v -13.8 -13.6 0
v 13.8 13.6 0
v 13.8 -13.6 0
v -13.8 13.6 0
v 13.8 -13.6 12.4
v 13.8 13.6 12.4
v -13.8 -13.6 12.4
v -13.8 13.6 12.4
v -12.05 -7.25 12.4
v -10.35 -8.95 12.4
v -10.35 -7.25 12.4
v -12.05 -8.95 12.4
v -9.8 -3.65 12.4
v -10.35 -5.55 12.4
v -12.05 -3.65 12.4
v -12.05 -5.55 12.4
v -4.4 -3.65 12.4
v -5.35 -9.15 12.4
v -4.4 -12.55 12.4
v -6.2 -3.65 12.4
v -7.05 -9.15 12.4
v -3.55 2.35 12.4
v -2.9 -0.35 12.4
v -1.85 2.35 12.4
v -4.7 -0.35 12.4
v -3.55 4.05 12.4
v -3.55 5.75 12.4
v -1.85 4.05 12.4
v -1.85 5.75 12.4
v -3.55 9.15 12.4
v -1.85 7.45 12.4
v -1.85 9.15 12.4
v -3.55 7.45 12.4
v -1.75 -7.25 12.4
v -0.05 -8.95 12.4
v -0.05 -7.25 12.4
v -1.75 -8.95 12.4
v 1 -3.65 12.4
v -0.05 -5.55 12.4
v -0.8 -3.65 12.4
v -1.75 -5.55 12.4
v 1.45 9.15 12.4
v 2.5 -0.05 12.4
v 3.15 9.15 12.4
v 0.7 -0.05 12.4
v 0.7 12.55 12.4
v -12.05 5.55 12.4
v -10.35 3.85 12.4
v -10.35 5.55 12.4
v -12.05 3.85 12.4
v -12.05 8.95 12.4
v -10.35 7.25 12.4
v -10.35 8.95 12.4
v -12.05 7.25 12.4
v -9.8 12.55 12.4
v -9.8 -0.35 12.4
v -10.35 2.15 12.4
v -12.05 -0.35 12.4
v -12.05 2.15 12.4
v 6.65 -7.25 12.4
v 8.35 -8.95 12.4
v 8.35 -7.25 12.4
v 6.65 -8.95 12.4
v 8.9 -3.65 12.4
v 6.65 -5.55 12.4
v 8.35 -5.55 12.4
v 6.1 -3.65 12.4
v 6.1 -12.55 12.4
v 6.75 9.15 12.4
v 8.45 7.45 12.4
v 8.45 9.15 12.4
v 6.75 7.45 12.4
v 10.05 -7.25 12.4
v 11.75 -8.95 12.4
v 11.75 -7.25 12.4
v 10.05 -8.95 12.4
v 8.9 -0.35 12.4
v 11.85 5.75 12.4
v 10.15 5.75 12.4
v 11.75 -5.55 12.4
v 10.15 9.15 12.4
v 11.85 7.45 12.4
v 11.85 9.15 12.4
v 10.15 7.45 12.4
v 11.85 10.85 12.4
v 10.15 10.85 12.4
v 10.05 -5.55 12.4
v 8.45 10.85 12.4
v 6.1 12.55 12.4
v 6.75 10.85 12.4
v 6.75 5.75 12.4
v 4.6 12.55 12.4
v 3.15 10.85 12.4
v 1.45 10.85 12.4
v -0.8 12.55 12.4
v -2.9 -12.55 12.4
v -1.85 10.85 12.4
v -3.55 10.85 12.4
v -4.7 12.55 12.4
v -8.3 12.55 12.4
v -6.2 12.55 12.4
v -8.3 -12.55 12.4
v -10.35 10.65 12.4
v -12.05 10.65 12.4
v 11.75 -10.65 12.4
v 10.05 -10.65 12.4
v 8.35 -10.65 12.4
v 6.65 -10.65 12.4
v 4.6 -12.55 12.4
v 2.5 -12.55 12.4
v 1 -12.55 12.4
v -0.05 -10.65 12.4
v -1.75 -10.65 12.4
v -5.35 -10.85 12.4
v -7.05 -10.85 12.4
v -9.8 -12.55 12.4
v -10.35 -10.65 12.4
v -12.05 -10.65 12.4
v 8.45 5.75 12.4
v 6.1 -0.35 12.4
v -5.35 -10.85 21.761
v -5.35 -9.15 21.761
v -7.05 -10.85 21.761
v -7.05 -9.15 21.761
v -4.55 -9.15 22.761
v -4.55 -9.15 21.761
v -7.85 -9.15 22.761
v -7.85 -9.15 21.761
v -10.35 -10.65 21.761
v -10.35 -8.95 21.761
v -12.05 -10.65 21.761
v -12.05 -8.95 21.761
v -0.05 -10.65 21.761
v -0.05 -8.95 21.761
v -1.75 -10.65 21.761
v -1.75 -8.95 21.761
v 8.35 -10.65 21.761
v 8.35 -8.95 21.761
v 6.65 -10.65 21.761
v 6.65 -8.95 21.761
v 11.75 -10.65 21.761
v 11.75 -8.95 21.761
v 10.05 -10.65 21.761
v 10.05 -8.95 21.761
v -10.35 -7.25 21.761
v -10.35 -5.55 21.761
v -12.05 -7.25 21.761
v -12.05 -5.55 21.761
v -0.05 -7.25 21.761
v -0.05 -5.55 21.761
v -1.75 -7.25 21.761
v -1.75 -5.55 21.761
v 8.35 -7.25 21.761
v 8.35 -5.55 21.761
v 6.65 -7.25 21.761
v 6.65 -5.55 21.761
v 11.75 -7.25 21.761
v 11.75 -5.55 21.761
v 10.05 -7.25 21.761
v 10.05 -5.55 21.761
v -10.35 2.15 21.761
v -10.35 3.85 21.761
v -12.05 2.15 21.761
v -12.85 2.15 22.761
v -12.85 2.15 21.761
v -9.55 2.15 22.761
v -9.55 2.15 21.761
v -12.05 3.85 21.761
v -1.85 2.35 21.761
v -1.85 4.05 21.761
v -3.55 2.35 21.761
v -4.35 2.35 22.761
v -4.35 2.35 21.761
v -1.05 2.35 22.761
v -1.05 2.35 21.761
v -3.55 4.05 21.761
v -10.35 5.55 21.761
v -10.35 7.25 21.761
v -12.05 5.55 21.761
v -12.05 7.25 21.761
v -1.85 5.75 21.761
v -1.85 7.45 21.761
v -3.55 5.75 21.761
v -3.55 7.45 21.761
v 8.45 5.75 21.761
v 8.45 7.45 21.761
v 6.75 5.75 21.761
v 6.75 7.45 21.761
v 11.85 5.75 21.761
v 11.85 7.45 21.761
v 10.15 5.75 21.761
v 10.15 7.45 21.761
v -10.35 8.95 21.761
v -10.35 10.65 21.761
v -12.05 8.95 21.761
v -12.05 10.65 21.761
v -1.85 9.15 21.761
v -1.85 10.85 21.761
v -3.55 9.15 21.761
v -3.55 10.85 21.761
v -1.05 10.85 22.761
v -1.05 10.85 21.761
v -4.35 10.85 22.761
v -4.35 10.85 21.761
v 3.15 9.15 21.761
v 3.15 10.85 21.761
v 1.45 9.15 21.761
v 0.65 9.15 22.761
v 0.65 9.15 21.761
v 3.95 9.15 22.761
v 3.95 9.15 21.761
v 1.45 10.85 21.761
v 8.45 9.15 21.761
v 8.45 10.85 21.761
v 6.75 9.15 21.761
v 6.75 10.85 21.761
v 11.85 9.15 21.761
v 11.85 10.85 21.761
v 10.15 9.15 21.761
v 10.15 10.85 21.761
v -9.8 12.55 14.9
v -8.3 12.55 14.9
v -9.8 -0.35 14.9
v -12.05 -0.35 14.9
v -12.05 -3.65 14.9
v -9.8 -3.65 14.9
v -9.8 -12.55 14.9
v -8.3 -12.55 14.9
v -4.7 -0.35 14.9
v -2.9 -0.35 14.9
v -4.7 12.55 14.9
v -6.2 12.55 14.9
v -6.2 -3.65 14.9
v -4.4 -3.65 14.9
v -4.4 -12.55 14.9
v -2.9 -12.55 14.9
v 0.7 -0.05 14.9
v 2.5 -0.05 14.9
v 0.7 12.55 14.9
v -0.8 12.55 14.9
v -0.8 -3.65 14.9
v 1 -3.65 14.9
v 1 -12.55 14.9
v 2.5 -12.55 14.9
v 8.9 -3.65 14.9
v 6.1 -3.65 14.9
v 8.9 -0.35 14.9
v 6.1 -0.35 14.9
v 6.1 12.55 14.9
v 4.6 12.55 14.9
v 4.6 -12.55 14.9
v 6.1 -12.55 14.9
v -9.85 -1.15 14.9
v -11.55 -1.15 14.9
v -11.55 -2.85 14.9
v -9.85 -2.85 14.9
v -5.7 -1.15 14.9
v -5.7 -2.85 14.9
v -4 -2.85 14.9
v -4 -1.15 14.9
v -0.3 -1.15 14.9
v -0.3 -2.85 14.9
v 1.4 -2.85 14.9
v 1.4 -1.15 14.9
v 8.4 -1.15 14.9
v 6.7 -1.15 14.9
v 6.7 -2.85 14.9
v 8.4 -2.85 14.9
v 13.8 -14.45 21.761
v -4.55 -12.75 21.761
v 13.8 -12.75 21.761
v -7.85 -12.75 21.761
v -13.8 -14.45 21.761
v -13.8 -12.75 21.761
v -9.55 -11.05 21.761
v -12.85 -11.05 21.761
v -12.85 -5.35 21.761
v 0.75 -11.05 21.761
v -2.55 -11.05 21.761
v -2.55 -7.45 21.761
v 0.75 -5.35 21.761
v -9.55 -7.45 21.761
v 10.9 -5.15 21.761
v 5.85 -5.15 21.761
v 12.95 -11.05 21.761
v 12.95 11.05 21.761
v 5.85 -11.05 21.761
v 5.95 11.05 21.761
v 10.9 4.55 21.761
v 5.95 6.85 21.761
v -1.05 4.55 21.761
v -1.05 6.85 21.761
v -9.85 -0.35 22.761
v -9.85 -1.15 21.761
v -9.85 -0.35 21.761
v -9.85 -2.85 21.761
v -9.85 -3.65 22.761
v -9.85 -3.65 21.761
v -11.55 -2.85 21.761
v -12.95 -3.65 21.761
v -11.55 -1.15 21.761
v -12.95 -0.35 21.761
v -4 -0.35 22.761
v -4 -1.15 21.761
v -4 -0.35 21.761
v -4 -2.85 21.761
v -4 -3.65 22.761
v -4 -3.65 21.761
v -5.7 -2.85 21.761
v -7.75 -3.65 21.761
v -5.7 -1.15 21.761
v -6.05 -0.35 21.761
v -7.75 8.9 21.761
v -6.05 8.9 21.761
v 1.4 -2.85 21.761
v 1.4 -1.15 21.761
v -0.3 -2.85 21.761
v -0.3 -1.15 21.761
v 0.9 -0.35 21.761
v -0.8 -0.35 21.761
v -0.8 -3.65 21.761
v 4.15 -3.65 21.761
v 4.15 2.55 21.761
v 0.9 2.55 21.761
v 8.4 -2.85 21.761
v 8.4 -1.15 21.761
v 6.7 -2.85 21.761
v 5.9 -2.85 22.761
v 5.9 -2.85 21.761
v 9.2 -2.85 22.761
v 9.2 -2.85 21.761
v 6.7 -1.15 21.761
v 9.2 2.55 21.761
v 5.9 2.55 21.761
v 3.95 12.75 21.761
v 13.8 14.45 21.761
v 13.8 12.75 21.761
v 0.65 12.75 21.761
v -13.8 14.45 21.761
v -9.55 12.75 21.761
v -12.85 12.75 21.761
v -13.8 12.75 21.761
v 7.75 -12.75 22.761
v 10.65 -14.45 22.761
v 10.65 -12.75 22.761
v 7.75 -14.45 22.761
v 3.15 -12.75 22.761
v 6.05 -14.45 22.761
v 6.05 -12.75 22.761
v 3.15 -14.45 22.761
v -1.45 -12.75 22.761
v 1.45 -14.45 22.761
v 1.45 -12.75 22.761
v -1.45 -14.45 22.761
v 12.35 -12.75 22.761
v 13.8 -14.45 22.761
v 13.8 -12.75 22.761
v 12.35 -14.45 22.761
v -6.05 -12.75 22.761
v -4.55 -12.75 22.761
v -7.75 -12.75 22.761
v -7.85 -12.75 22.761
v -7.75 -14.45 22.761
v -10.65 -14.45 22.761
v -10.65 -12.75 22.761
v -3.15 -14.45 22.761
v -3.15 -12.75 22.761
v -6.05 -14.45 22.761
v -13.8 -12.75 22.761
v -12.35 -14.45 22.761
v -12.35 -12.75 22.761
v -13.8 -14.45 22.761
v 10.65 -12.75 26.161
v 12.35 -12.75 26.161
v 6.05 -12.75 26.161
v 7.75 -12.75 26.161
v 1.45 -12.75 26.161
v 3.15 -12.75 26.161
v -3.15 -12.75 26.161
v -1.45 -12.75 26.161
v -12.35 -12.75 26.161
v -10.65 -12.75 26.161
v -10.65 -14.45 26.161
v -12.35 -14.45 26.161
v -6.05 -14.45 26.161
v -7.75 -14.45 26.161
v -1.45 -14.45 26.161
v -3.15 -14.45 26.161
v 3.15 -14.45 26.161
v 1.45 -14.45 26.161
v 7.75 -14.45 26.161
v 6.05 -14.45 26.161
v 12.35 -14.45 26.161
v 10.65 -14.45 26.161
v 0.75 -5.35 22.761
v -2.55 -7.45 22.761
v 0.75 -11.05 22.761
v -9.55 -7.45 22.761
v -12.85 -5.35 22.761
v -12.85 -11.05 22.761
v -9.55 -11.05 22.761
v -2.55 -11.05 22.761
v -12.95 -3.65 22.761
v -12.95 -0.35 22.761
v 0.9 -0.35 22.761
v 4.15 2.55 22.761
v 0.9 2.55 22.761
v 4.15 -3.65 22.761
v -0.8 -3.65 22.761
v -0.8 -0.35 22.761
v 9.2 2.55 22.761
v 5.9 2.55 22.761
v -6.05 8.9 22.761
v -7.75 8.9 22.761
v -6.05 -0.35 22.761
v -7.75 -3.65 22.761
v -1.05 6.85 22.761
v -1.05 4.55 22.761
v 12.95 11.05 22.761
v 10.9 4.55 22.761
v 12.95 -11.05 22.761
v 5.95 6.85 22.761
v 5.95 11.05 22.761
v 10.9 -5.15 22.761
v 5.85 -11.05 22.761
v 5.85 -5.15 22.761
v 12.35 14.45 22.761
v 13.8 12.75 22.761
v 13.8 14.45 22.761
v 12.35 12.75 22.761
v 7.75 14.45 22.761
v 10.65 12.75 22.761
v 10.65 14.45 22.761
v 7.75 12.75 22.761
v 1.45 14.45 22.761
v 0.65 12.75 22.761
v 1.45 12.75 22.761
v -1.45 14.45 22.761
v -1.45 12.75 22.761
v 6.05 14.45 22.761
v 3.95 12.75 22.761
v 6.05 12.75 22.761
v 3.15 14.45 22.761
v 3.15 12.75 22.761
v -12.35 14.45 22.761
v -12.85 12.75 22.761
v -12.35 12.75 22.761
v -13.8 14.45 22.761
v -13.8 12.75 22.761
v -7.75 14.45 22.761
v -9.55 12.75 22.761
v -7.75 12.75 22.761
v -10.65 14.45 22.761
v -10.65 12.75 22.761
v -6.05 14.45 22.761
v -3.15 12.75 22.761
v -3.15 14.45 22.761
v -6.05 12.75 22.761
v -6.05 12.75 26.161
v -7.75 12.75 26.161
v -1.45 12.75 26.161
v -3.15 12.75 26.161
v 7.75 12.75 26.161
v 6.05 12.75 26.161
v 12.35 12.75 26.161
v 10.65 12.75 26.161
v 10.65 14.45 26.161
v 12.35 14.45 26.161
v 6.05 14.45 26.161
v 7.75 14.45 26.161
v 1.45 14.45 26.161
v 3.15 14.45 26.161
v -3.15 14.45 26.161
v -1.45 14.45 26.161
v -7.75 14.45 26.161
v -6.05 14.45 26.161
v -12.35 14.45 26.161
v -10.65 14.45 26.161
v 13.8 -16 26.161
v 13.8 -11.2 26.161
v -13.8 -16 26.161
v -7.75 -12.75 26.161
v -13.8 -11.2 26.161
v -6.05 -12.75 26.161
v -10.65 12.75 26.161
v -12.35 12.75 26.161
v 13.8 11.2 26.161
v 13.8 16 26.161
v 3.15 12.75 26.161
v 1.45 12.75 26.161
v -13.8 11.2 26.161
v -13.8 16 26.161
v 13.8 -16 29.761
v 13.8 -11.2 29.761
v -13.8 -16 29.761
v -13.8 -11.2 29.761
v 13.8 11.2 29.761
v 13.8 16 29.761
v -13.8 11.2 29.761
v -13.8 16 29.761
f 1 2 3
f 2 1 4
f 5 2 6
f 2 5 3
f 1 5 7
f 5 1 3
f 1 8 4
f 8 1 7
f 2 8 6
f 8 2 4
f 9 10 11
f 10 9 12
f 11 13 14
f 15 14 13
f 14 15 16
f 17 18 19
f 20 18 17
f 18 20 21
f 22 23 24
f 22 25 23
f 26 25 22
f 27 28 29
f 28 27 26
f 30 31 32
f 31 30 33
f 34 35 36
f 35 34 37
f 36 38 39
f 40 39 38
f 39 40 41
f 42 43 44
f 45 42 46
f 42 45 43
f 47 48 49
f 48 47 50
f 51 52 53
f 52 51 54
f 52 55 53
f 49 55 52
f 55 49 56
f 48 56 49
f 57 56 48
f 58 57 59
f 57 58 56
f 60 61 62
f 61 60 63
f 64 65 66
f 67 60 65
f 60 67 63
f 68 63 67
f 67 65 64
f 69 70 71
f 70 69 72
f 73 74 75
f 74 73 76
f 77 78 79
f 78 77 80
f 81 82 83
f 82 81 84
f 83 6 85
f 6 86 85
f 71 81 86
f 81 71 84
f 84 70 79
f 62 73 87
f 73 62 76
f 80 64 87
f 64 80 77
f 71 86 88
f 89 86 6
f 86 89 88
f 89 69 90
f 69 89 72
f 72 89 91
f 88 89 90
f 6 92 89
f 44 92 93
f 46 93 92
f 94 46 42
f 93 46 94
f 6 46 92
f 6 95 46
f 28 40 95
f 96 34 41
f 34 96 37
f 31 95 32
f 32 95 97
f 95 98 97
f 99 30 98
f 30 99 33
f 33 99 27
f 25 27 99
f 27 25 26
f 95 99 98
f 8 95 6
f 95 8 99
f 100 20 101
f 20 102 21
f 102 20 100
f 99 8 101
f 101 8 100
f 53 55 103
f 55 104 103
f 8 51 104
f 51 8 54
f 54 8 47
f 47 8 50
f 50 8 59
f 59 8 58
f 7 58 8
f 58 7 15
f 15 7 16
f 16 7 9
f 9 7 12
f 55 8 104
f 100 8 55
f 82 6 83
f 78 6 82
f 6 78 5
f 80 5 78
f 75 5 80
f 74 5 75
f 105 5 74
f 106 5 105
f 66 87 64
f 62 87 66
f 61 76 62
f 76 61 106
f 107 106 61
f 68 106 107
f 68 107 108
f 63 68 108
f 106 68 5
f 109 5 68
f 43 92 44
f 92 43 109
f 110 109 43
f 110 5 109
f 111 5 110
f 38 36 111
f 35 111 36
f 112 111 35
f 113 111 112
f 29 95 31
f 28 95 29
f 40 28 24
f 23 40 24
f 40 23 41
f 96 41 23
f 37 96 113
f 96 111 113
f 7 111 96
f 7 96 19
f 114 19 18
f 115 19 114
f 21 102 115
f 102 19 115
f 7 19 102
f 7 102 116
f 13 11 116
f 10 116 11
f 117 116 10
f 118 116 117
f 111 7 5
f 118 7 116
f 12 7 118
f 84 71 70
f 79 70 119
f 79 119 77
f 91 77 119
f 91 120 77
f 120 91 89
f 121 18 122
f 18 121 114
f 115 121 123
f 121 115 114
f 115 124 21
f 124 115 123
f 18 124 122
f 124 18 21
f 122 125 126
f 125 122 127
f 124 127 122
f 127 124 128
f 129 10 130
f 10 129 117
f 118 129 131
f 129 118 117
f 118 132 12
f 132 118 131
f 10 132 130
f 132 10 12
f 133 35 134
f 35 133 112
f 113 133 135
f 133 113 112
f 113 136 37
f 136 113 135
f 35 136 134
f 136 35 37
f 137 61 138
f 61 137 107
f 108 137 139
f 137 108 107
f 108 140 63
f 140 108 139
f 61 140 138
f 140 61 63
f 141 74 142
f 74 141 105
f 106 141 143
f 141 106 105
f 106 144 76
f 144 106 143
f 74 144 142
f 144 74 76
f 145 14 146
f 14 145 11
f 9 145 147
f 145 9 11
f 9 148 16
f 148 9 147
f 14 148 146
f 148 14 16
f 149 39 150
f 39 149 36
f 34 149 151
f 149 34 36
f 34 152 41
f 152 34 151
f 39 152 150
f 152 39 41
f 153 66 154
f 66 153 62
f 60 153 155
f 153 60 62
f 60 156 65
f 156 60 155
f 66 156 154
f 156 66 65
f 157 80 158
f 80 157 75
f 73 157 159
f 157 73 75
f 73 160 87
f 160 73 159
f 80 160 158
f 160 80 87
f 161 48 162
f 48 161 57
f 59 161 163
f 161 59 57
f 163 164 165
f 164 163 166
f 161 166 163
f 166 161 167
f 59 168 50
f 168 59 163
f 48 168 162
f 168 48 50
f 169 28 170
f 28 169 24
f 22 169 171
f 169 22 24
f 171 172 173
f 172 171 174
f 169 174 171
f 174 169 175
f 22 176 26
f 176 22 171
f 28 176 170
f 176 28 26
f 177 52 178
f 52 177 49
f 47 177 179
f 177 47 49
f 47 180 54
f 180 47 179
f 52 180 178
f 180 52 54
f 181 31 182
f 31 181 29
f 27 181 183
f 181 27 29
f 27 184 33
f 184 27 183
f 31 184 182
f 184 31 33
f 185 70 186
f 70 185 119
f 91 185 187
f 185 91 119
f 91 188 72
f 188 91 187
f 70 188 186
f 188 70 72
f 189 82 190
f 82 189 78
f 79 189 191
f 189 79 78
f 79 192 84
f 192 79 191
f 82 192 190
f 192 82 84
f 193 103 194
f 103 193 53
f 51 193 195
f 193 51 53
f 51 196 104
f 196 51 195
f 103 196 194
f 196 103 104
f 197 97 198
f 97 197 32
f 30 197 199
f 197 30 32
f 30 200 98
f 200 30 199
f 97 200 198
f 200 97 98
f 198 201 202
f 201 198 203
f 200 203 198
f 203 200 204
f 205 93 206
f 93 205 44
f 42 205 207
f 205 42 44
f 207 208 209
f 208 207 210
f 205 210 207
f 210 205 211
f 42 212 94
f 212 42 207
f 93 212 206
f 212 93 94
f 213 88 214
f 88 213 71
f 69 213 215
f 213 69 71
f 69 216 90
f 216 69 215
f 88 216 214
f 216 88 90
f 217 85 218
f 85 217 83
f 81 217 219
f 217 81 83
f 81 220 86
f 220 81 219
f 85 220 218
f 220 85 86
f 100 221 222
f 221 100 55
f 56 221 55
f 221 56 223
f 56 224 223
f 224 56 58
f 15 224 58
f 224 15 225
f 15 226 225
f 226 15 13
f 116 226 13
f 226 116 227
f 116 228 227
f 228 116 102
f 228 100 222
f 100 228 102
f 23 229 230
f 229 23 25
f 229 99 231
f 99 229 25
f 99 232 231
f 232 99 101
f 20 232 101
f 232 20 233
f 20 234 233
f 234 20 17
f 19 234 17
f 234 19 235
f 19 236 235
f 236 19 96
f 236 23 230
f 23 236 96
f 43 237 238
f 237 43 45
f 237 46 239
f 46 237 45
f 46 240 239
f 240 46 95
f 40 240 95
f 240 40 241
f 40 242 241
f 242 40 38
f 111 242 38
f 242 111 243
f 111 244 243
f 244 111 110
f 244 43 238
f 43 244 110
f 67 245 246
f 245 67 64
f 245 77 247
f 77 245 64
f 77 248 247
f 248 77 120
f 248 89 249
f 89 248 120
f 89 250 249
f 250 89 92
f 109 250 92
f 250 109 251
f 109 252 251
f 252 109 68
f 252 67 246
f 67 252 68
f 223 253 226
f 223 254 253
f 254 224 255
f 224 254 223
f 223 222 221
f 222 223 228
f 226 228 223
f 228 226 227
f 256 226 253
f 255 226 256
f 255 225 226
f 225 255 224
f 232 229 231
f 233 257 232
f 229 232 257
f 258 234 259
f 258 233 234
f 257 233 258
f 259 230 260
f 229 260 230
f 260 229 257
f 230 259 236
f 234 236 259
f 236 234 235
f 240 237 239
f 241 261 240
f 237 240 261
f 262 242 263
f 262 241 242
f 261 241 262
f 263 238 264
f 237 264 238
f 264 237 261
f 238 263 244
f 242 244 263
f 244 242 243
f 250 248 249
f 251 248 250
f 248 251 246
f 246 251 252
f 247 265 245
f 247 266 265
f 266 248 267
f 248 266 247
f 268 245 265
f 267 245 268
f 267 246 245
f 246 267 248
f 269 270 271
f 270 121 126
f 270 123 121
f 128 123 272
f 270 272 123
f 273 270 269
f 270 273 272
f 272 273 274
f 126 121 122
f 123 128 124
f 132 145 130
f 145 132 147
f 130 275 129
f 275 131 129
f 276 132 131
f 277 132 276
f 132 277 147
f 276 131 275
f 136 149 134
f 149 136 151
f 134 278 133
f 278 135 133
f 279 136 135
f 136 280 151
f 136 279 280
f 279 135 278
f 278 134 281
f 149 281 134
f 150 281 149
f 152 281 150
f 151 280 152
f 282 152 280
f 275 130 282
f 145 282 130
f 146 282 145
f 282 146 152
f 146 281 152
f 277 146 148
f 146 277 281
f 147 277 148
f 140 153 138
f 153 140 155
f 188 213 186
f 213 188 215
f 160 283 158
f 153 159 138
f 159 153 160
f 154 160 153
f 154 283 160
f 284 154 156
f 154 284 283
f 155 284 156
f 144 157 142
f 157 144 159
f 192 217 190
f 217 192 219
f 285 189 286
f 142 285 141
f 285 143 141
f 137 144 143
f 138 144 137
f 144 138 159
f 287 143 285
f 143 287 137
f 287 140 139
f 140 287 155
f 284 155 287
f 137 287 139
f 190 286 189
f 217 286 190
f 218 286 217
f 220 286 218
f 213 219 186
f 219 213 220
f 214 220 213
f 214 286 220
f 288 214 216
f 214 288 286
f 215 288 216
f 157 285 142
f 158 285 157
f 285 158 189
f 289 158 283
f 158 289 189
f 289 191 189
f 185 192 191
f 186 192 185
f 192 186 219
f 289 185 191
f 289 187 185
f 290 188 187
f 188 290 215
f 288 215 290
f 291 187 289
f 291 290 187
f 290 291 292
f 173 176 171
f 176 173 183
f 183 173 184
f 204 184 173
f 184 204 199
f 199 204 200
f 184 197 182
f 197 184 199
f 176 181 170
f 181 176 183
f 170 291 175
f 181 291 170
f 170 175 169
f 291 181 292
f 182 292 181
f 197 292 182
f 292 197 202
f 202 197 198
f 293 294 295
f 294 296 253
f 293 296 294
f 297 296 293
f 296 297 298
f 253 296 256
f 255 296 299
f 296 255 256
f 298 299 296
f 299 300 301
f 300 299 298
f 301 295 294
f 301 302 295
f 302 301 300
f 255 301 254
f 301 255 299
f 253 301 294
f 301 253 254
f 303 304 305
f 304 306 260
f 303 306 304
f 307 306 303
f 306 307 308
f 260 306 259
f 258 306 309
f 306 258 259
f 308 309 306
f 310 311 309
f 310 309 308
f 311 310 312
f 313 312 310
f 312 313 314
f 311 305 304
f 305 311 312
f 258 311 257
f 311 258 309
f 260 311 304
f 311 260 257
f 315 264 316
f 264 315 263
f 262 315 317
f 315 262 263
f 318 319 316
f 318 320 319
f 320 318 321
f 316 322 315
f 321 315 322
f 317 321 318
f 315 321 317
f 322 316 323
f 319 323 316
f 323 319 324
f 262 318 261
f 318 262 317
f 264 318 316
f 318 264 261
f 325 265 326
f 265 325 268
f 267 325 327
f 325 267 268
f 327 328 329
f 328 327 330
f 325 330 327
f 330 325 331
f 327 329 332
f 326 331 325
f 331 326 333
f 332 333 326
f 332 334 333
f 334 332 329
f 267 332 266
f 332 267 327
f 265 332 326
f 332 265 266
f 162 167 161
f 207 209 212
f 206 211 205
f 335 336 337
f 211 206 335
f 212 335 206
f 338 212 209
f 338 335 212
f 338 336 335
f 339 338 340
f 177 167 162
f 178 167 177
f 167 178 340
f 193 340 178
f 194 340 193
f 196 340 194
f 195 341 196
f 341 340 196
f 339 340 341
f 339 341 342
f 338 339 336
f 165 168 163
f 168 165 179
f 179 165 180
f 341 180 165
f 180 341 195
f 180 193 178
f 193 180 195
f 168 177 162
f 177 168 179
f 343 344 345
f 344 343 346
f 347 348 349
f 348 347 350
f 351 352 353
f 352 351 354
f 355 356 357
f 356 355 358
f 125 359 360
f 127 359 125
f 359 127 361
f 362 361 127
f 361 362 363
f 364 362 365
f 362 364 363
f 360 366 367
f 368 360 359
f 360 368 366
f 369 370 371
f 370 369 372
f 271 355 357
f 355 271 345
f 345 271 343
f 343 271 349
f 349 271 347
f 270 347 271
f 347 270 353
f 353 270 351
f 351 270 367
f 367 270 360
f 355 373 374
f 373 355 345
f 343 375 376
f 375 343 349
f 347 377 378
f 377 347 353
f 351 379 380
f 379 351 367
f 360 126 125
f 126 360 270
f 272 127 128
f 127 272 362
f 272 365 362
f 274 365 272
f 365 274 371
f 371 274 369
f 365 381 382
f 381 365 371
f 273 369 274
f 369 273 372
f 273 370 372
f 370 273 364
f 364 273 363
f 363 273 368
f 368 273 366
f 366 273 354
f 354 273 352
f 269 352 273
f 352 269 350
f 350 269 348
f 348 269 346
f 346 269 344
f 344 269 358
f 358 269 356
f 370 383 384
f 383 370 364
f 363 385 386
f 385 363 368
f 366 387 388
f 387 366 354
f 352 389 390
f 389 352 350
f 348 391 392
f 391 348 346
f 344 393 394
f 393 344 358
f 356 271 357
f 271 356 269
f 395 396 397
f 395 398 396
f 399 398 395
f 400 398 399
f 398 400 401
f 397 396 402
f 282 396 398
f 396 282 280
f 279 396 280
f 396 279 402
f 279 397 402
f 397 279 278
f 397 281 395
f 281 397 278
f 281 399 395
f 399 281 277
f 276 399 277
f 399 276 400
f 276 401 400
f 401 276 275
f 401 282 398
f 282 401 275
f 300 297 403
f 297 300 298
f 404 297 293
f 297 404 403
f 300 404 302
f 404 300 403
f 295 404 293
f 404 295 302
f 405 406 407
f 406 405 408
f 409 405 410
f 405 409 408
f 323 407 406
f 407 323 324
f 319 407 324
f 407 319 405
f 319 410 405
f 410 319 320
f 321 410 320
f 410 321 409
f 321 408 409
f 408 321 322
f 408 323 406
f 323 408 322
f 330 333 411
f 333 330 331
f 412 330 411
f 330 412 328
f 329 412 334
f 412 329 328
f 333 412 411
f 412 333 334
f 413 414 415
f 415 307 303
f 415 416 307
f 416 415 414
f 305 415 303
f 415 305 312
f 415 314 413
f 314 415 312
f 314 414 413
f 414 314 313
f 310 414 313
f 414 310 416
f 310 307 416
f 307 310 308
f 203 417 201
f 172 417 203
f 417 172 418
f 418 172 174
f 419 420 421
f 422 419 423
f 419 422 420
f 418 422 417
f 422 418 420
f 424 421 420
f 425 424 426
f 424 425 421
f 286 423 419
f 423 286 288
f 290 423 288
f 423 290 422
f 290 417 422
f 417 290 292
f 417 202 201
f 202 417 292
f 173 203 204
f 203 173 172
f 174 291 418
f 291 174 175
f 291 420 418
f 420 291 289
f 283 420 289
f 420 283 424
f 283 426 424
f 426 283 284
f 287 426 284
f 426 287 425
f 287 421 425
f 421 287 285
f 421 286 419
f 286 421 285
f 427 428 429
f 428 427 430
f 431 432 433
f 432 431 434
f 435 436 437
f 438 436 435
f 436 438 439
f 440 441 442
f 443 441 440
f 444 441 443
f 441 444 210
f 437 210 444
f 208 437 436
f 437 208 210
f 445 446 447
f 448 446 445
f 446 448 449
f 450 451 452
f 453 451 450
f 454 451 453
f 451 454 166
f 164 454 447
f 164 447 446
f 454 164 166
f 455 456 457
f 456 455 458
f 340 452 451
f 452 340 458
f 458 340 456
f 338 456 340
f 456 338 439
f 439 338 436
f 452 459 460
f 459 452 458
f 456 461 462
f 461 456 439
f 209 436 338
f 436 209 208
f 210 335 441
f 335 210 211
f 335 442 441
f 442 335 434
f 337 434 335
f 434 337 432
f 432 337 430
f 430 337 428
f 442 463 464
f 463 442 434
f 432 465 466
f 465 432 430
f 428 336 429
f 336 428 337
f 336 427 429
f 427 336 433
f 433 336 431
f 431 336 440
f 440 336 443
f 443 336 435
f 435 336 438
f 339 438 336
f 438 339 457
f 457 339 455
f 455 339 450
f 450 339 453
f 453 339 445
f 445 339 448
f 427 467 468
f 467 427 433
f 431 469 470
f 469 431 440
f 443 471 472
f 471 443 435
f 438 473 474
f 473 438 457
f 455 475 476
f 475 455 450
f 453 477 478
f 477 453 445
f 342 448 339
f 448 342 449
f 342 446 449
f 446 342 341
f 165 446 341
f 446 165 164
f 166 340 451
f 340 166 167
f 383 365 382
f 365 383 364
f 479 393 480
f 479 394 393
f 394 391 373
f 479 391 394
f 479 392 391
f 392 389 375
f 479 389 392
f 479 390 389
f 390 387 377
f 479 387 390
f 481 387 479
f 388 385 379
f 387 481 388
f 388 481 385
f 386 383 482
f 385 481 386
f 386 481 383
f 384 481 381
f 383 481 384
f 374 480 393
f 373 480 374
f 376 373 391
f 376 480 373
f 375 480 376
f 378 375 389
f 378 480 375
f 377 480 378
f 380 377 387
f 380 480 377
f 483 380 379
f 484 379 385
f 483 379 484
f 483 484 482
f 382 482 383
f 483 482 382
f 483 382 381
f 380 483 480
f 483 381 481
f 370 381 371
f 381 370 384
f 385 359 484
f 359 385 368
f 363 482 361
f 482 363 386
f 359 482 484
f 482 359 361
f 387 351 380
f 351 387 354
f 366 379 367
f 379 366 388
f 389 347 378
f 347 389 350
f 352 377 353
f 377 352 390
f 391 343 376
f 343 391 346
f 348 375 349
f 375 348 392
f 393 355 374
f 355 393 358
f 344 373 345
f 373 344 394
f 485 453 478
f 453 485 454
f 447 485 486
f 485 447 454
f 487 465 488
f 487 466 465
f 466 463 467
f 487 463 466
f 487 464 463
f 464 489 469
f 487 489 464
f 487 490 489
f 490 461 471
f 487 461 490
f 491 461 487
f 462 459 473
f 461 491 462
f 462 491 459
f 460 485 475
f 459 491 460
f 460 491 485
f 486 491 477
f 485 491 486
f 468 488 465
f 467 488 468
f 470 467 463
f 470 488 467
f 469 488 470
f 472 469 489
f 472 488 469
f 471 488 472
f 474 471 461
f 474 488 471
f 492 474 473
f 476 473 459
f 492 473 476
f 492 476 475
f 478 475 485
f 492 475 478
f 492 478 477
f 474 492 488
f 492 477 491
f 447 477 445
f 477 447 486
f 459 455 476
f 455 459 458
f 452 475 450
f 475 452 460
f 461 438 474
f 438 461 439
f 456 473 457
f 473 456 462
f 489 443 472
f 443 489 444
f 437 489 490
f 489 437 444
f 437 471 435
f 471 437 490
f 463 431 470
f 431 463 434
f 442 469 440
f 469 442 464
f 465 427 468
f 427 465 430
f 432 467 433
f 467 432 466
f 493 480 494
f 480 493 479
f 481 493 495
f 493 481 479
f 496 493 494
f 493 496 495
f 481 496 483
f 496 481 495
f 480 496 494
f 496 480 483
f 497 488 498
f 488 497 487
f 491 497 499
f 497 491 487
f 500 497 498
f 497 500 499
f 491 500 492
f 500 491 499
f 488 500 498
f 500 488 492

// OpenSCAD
// Generated by SolidPython 0.4.2 on 2020-09-29 23:21:41
//!OpenSCAD

scale(v = 0.0100000000) {
	translate(v = [-1380, -1360, 0]) {
		union() {
			color(c = [0.4000000000, 0.4000000000, 0.4000000000]) {
				translate(v = [0, 0, 0]) {
					linear_extrude(height = 1000.0000000000) {
						polygon(paths = [[0, 1, 2, 3]], points = [[0, 0], [0, 2720], [2760, 2720], [2760, 0]]);
					}
				}
			}
			color(c = [0.2000000000, 0.6000000000, 0.2000000000]) {
				translate(v = [0, 0, 1000.0000000000]) {
					linear_extrude(height = 120.0000000000) {
						polygon(paths = [[0, 1, 2, 3]], points = [[0, 1305], [0, 2720], [2760, 2720], [2760, 1305]]);
					}
				}
			}
			color(c = [0.4000000000, 0.4000000000, 0.4000000000]) {
				translate(v = [0, 0, 1000.0000000000]) {
					linear_extrude(height = 120.0000000000) {
						polygon(paths = [[0, 1, 2, 3]], points = [[0, 0], [0, 1305], [2760, 1305], [2760, 0]]);
					}
				}
			}
			color(c = [0.9000000000, 0.6000000000, 0.6000000000]) {
				translate(v = [0, 0, 1120.0000000000]) {
					linear_extrude(height = 120.0000000000) {
						polygon(paths = [[0, 1, 2, 3]], points = [[135, 1485], [135, 2485], [400, 2485], [400, 1485]]);
					}
				}
			}
			color(c = [0.9000000000, 0.6000000000, 0.6000000000]) {
				translate(v = [0, 0, 1120.0000000000]) {
					linear_extrude(height = 120.0000000000) {
						polygon(paths = [[0, 1, 2, 3]], points = [[550, 1485], [550, 2485], [760, 2485], [760, 1485]]);
					}
				}
			}
			color(c = [0.9000000000, 0.6000000000, 0.6000000000]) {
				translate(v = [0, 0, 1120.0000000000]) {
					linear_extrude(height = 120.0000000000) {
						polygon(paths = [[0, 1, 2, 3]], points = [[910, 1485], [910, 2485], [1300, 2485], [1300, 1485]]);
					}
				}
			}
			color(c = [0.9000000000, 0.6000000000, 0.6000000000]) {
				translate(v = [0, 0, 1120.0000000000]) {
					linear_extrude(height = 120.0000000000) {
						polygon(paths = [[0, 1, 2, 3]], points = [[1450, 1485], [1450, 2485], [1840, 2485], [1840, 1485]]);
					}
				}
			}
			color(c = [0.9000000000, 0.6000000000, 0.6000000000]) {
				translate(v = [0, 0, 1120.0000000000]) {
					linear_extrude(height = 120.0000000000) {
						polygon(paths = [[0, 1, 2, 3]], points = [[1990, 1485], [1990, 2485], [2625, 2485], [2625, 1485]]);
					}
				}
			}
			color(c = [0.9000000000, 0.6000000000, 0.9000000000]) {
				translate(v = [0, 0, 1120.0000000000]) {
					linear_extrude(height = 120.0000000000) {
						polygon(paths = [[0, 1, 2, 3]], points = [[135, 235], [135, 885], [400, 885], [400, 235]]);
					}
				}
			}
			color(c = [0.9000000000, 0.6000000000, 0.9000000000]) {
				translate(v = [0, 0, 1120.0000000000]) {
					linear_extrude(height = 120.0000000000) {
						polygon(paths = [[0, 1, 2, 3]], points = [[550, 235], [550, 885], [940, 885], [940, 235]]);
					}
				}
			}
			color(c = [0.9000000000, 0.6000000000, 0.9000000000]) {
				translate(v = [0, 0, 1120.0000000000]) {
					linear_extrude(height = 120.0000000000) {
						polygon(paths = [[0, 1, 2, 3]], points = [[1090, 235], [1090, 885], [1480, 885], [1480, 235]]);
					}
				}
			}
			color(c = [0.9000000000, 0.6000000000, 0.9000000000]) {
				translate(v = [0, 0, 1120.0000000000]) {
					linear_extrude(height = 120.0000000000) {
						polygon(paths = [[0, 1, 2, 3]], points = [[1630, 235], [1630, 885], [1840, 885], [1840, 235]]);
					}
				}
			}
			color(c = [0.9000000000, 0.6000000000, 0.9000000000]) {
				translate(v = [0, 0, 1120.0000000000]) {
					linear_extrude(height = 120.0000000000) {
						polygon(paths = [[0, 1, 2, 3]], points = [[1990, 235], [1990, 885], [2595, 885], [2595, 235]]);
					}
				}
			}
			color(c = [0.2000000000, 0.6000000000, 0.2000000000]) {
				translate(v = [0, 0, 1120.0000000000]) {
					linear_extrude(height = 120.0000000000) {
						difference() {
							polygon(paths = [[0, 1, 2, 3]], points = [[0, 1305], [0, 2720], [2760, 2720], [2760, 1305]]);
							polygon(paths = [[0, 1, 2, 3]], points = [[135, 1485], [400, 1485], [400, 2485], [135, 2485]]);
							polygon(paths = [[0, 1, 2, 3]], points = [[550, 1485], [760, 1485], [760, 2485], [550, 2485]]);
							polygon(paths = [[0, 1, 2, 3]], points = [[910, 1485], [1300, 1485], [1300, 2485], [910, 2485]]);
							polygon(paths = [[0, 1, 2, 3]], points = [[1450, 1485], [1840, 1485], [1840, 2485], [1450, 2485]]);
							polygon(paths = [[0, 1, 2, 3]], points = [[1990, 1485], [2625, 1485], [2625, 2485], [1990, 2485]]);
						}
					}
				}
			}
			color(c = [0.4000000000, 0.4000000000, 0.4000000000]) {
				translate(v = [0, 0, 1120.0000000000]) {
					linear_extrude(height = 120.0000000000) {
						difference() {
							polygon(paths = [[0, 1, 2, 3]], points = [[0, 0], [0, 1305], [2760, 1305], [2760, 0]]);
							polygon(paths = [[0, 1, 2, 3]], points = [[135, 235], [400, 235], [400, 885], [135, 885]]);
							polygon(paths = [[0, 1, 2, 3]], points = [[550, 235], [940, 235], [940, 885], [550, 885]]);
							polygon(paths = [[0, 1, 2, 3]], points = [[1090, 235], [1480, 235], [1480, 885], [1090, 885]]);
							polygon(paths = [[0, 1, 2, 3]], points = [[1630, 235], [1840, 235], [1840, 885], [1630, 885]]);
							polygon(paths = [[0, 1, 2, 3]], points = [[1990, 235], [2595, 235], [2595, 885], [1990, 885]]);
						}
					}
				}
			}
			color(c = [0.1000000000, 0.1000000000, 0.1000000000]) {
				translate(v = [0, 0, 1240.0000000000]) {
					linear_extrude(height = 70.0000000000) {
						polygon(paths = [[0, 1, 2, 3]], points = [[675, 275], [675, 445], [845, 445], [845, 275]]);
					}
				}
			}
			color(c = [0.1000000000, 0.1000000000, 0.1000000000]) {
				translate(v = [0, 0, 1240.0000000000]) {
					linear_extrude(height = 70.0000000000) {
						polygon(paths = [[0, 1, 2, 3]], points = [[175, 295], [175, 465], [345, 465], [345, 295]]);
					}
				}
			}
			color(c = [0.1000000000, 0.1000000000, 0.1000000000]) {
				translate(v = [0, 0, 1240.0000000000]) {
					linear_extrude(height = 70.0000000000) {
						polygon(paths = [[0, 1, 2, 3]], points = [[1205, 295], [1205, 465], [1375, 465], [1375, 295]]);
					}
				}
			}
			color(c = [0.1000000000, 0.1000000000, 0.1000000000]) {
				translate(v = [0, 0, 1240.0000000000]) {
					linear_extrude(height = 70.0000000000) {
						polygon(paths = [[0, 1, 2, 3]], points = [[2045, 295], [2045, 465], [2215, 465], [2215, 295]]);
					}
				}
			}
			color(c = [0.1000000000, 0.1000000000, 0.1000000000]) {
				translate(v = [0, 0, 1240.0000000000]) {
					linear_extrude(height = 70.0000000000) {
						polygon(paths = [[0, 1, 2, 3]], points = [[2385, 295], [2385, 465], [2555, 465], [2555, 295]]);
					}
				}
			}
			color(c = [0.1000000000, 0.1000000000, 0.1000000000]) {
				translate(v = [0, 0, 1240.0000000000]) {
					linear_extrude(height = 70.0000000000) {
						polygon(paths = [[0, 1, 2, 3]], points = [[175, 635], [175, 805], [345, 805], [345, 635]]);
					}
				}
			}
			color(c = [0.1000000000, 0.1000000000, 0.1000000000]) {
				translate(v = [0, 0, 1240.0000000000]) {
					linear_extrude(height = 70.0000000000) {
						polygon(paths = [[0, 1, 2, 3]], points = [[1205, 635], [1205, 805], [1375, 805], [1375, 635]]);
					}
				}
			}
			color(c = [0.1000000000, 0.1000000000, 0.1000000000]) {
				translate(v = [0, 0, 1240.0000000000]) {
					linear_extrude(height = 70.0000000000) {
						polygon(paths = [[0, 1, 2, 3]], points = [[2045, 635], [2045, 805], [2215, 805], [2215, 635]]);
					}
				}
			}
			color(c = [0.1000000000, 0.1000000000, 0.1000000000]) {
				translate(v = [0, 0, 1240.0000000000]) {
					linear_extrude(height = 70.0000000000) {
						polygon(paths = [[0, 1, 2, 3]], points = [[2385, 635], [2385, 805], [2555, 805], [2555, 635]]);
					}
				}
			}
			color(c = [0.1000000000, 0.1000000000, 0.1000000000]) {
				translate(v = [0, 0, 1240.0000000000]) {
					linear_extrude(height = 70.0000000000) {
						polygon(paths = [[0, 1, 2, 3]], points = [[175, 1575], [175, 1745], [345, 1745], [345, 1575]]);
					}
				}
			}
			color(c = [0.1000000000, 0.1000000000, 0.1000000000]) {
				translate(v = [0, 0, 1240.0000000000]) {
					linear_extrude(height = 70.0000000000) {
						polygon(paths = [[0, 1, 2, 3]], points = [[1025, 1595], [1025, 1765], [1195, 1765], [1195, 1595]]);
					}
				}
			}
			color(c = [0.1000000000, 0.1000000000, 0.1000000000]) {
				translate(v = [0, 0, 1240.0000000000]) {
					linear_extrude(height = 70.0000000000) {
						polygon(paths = [[0, 1, 2, 3]], points = [[175, 1915], [175, 2085], [345, 2085], [345, 1915]]);
					}
				}
			}
			color(c = [0.1000000000, 0.1000000000, 0.1000000000]) {
				translate(v = [0, 0, 1240.0000000000]) {
					linear_extrude(height = 70.0000000000) {
						polygon(paths = [[0, 1, 2, 3]], points = [[1025, 1935], [1025, 2105], [1195, 2105], [1195, 1935]]);
					}
				}
			}
			color(c = [0.1000000000, 0.1000000000, 0.1000000000]) {
				translate(v = [0, 0, 1240.0000000000]) {
					linear_extrude(height = 70.0000000000) {
						polygon(paths = [[0, 1, 2, 3]], points = [[2055, 1935], [2055, 2105], [2225, 2105], [2225, 1935]]);
					}
				}
			}
			color(c = [0.1000000000, 0.1000000000, 0.1000000000]) {
				translate(v = [0, 0, 1240.0000000000]) {
					linear_extrude(height = 70.0000000000) {
						polygon(paths = [[0, 1, 2, 3]], points = [[2395, 1935], [2395, 2105], [2565, 2105], [2565, 1935]]);
					}
				}
			}
			color(c = [0.1000000000, 0.1000000000, 0.1000000000]) {
				translate(v = [0, 0, 1240.0000000000]) {
					linear_extrude(height = 70.0000000000) {
						polygon(paths = [[0, 1, 2, 3]], points = [[175, 2255], [175, 2425], [345, 2425], [345, 2255]]);
					}
				}
			}
			color(c = [0.1000000000, 0.1000000000, 0.1000000000]) {
				translate(v = [0, 0, 1240.0000000000]) {
					linear_extrude(height = 70.0000000000) {
						polygon(paths = [[0, 1, 2, 3]], points = [[1025, 2275], [1025, 2445], [1195, 2445], [1195, 2275]]);
					}
				}
			}
			color(c = [0.1000000000, 0.1000000000, 0.1000000000]) {
				translate(v = [0, 0, 1240.0000000000]) {
					linear_extrude(height = 70.0000000000) {
						polygon(paths = [[0, 1, 2, 3]], points = [[1525, 2275], [1525, 2445], [1695, 2445], [1695, 2275]]);
					}
				}
			}
			color(c = [0.1000000000, 0.1000000000, 0.1000000000]) {
				translate(v = [0, 0, 1240.0000000000]) {
					linear_extrude(height = 70.0000000000) {
						polygon(paths = [[0, 1, 2, 3]], points = [[2055, 2275], [2055, 2445], [2225, 2445], [2225, 2275]]);
					}
				}
			}
			color(c = [0.1000000000, 0.1000000000, 0.1000000000]) {
				translate(v = [0, 0, 1240.0000000000]) {
					linear_extrude(height = 70.0000000000) {
						polygon(paths = [[0, 1, 2, 3]], points = [[2395, 2275], [2395, 2445], [2565, 2445], [2565, 2275]]);
					}
				}
			}
			color(c = [1.0000000000, 1.0000000000, 1.0000000000]) {
				translate(v = [0, 0, 1240.0000000000]) {
					linear_extrude(height = 70.0000000000) {
						polygon(paths = [[0, 1, 2, 3, 4, 5, 6, 7]], points = [[400, 105], [400, 995], [175, 995], [175, 1325], [400, 1325], [400, 2615], [550, 2615], [550, 105]]);
					}
				}
			}
			color(c = [1.0000000000, 1.0000000000, 1.0000000000]) {
				translate(v = [0, 0, 1240.0000000000]) {
					linear_extrude(height = 70.0000000000) {
						polygon(paths = [[0, 1, 2, 3, 4, 5, 6, 7]], points = [[940, 105], [940, 995], [760, 995], [760, 2615], [910, 2615], [910, 1325], [1090, 1325], [1090, 105]]);
					}
				}
			}
			color(c = [1.0000000000, 1.0000000000, 1.0000000000]) {
				translate(v = [0, 0, 1240.0000000000]) {
					linear_extrude(height = 70.0000000000) {
						polygon(paths = [[0, 1, 2, 3, 4, 5, 6, 7]], points = [[1480, 105], [1480, 995], [1300, 995], [1300, 2615], [1450, 2615], [1450, 1355], [1630, 1355], [1630, 105]]);
					}
				}
			}
			color(c = [1.0000000000, 1.0000000000, 1.0000000000]) {
				translate(v = [0, 0, 1240.0000000000]) {
					linear_extrude(height = 70.0000000000) {
						polygon(paths = [[0, 1, 2, 3, 4, 5, 6, 7]], points = [[1840, 105], [1840, 2615], [1990, 2615], [1990, 1325], [2270, 1325], [2270, 995], [1990, 995], [1990, 105]]);
					}
				}
			}
			color(c = [0.1000000000, 0.1000000000, 0.1000000000]) {
				translate(v = [0, 0, 1310.0000000000]) {
					linear_extrude(height = 180.0000000000) {
						polygon(paths = [[0, 1, 2, 3]], points = [[675, 275], [675, 445], [845, 445], [845, 275]]);
					}
				}
			}
			color(c = [0.1000000000, 0.1000000000, 0.1000000000]) {
				translate(v = [0, 0, 1310.0000000000]) {
					linear_extrude(height = 180.0000000000) {
						polygon(paths = [[0, 1, 2, 3]], points = [[175, 295], [175, 465], [345, 465], [345, 295]]);
					}
				}
			}
			color(c = [0.1000000000, 0.1000000000, 0.1000000000]) {
				translate(v = [0, 0, 1310.0000000000]) {
					linear_extrude(height = 180.0000000000) {
						polygon(paths = [[0, 1, 2, 3]], points = [[1205, 295], [1205, 465], [1375, 465], [1375, 295]]);
					}
				}
			}
			color(c = [0.1000000000, 0.1000000000, 0.1000000000]) {
				translate(v = [0, 0, 1310.0000000000]) {
					linear_extrude(height = 180.0000000000) {
						polygon(paths = [[0, 1, 2, 3]], points = [[2045, 295], [2045, 465], [2215, 465], [2215, 295]]);
					}
				}
			}
			color(c = [0.1000000000, 0.1000000000, 0.1000000000]) {
				translate(v = [0, 0, 1310.0000000000]) {
					linear_extrude(height = 180.0000000000) {
						polygon(paths = [[0, 1, 2, 3]], points = [[2385, 295], [2385, 465], [2555, 465], [2555, 295]]);
					}
				}
			}
			color(c = [0.1000000000, 0.1000000000, 0.1000000000]) {
				translate(v = [0, 0, 1310.0000000000]) {
					linear_extrude(height = 180.0000000000) {
						polygon(paths = [[0, 1, 2, 3]], points = [[175, 635], [175, 805], [345, 805], [345, 635]]);
					}
				}
			}
			color(c = [0.1000000000, 0.1000000000, 0.1000000000]) {
				translate(v = [0, 0, 1310.0000000000]) {
					linear_extrude(height = 180.0000000000) {
						polygon(paths = [[0, 1, 2, 3]], points = [[1205, 635], [1205, 805], [1375, 805], [1375, 635]]);
					}
				}
			}
			color(c = [0.1000000000, 0.1000000000, 0.1000000000]) {
				translate(v = [0, 0, 1310.0000000000]) {
					linear_extrude(height = 180.0000000000) {
						polygon(paths = [[0, 1, 2, 3]], points = [[2045, 635], [2045, 805], [2215, 805], [2215, 635]]);
					}
				}
			}
			color(c = [0.1000000000, 0.1000000000, 0.1000000000]) {
				translate(v = [0, 0, 1310.0000000000]) {
					linear_extrude(height = 180.0000000000) {
						polygon(paths = [[0, 1, 2, 3]], points = [[2385, 635], [2385, 805], [2555, 805], [2555, 635]]);
					}
				}
			}
			color(c = [0.1000000000, 0.1000000000, 0.1000000000]) {
				translate(v = [0, 0, 1310.0000000000]) {
					linear_extrude(height = 180.0000000000) {
						polygon(paths = [[0, 1, 2, 3]], points = [[175, 1575], [175, 1745], [345, 1745], [345, 1575]]);
					}
				}
			}
			color(c = [0.1000000000, 0.1000000000, 0.1000000000]) {
				translate(v = [0, 0, 1310.0000000000]) {
					linear_extrude(height = 180.0000000000) {
						polygon(paths = [[0, 1, 2, 3]], points = [[1025, 1595], [1025, 1765], [1195, 1765], [1195, 1595]]);
					}
				}
			}
			color(c = [0.1000000000, 0.1000000000, 0.1000000000]) {
				translate(v = [0, 0, 1310.0000000000]) {
					linear_extrude(height = 180.0000000000) {
						polygon(paths = [[0, 1, 2, 3]], points = [[175, 1915], [175, 2085], [345, 2085], [345, 1915]]);
					}
				}
			}
			color(c = [0.1000000000, 0.1000000000, 0.1000000000]) {
				translate(v = [0, 0, 1310.0000000000]) {
					linear_extrude(height = 180.0000000000) {
						polygon(paths = [[0, 1, 2, 3]], points = [[1025, 1935], [1025, 2105], [1195, 2105], [1195, 1935]]);
					}
				}
			}
			color(c = [0.1000000000, 0.1000000000, 0.1000000000]) {
				translate(v = [0, 0, 1310.0000000000]) {
					linear_extrude(height = 180.0000000000) {
						polygon(paths = [[0, 1, 2, 3]], points = [[2055, 1935], [2055, 2105], [2225, 2105], [2225, 1935]]);
					}
				}
			}
			color(c = [0.1000000000, 0.1000000000, 0.1000000000]) {
				translate(v = [0, 0, 1310.0000000000]) {
					linear_extrude(height = 180.0000000000) {
						polygon(paths = [[0, 1, 2, 3]], points = [[2395, 1935], [2395, 2105], [2565, 2105], [2565, 1935]]);
					}
				}
			}
			color(c = [0.1000000000, 0.1000000000, 0.1000000000]) {
				translate(v = [0, 0, 1310.0000000000]) {
					linear_extrude(height = 180.0000000000) {
						polygon(paths = [[0, 1, 2, 3]], points = [[175, 2255], [175, 2425], [345, 2425], [345, 2255]]);
					}
				}
			}
			color(c = [0.1000000000, 0.1000000000, 0.1000000000]) {
				translate(v = [0, 0, 1310.0000000000]) {
					linear_extrude(height = 180.0000000000) {
						polygon(paths = [[0, 1, 2, 3]], points = [[1025, 2275], [1025, 2445], [1195, 2445], [1195, 2275]]);
					}
				}
			}
			color(c = [0.1000000000, 0.1000000000, 0.1000000000]) {
				translate(v = [0, 0, 1310.0000000000]) {
					linear_extrude(height = 180.0000000000) {
						polygon(paths = [[0, 1, 2, 3]], points = [[1525, 2275], [1525, 2445], [1695, 2445], [1695, 2275]]);
					}
				}
			}
			color(c = [0.1000000000, 0.1000000000, 0.1000000000]) {
				translate(v = [0, 0, 1310.0000000000]) {
					linear_extrude(height = 180.0000000000) {
						polygon(paths = [[0, 1, 2, 3]], points = [[2055, 2275], [2055, 2445], [2225, 2445], [2225, 2275]]);
					}
				}
			}
			color(c = [0.1000000000, 0.1000000000, 0.1000000000]) {
				translate(v = [0, 0, 1310.0000000000]) {
					linear_extrude(height = 180.0000000000) {
						polygon(paths = [[0, 1, 2, 3]], points = [[2395, 2275], [2395, 2445], [2565, 2445], [2565, 2275]]);
					}
				}
			}
			color(c = [0.7000000000, 0, 0]) {
				translate(v = [0, 0, 1310.0000000000]) {
					linear_extrude(height = 180.0000000000) {
						polygon(paths = [[0, 1, 2, 3, 4, 5, 6, 7]], points = [[400, 105], [400, 995], [175, 995], [175, 1325], [400, 1325], [400, 2615], [550, 2615], [550, 105]]);
					}
				}
			}
			color(c = [0.7000000000, 0, 0]) {
				translate(v = [0, 0, 1310.0000000000]) {
					linear_extrude(height = 180.0000000000) {
						polygon(paths = [[0, 1, 2, 3, 4, 5, 6, 7]], points = [[940, 105], [940, 995], [760, 995], [760, 2615], [910, 2615], [910, 1325], [1090, 1325], [1090, 105]]);
					}
				}
			}
			color(c = [0.7000000000, 0, 0]) {
				translate(v = [0, 0, 1310.0000000000]) {
					linear_extrude(height = 180.0000000000) {
						polygon(paths = [[0, 1, 2, 3, 4, 5, 6, 7]], points = [[1480, 105], [1480, 995], [1300, 995], [1300, 2615], [1450, 2615], [1450, 1355], [1630, 1355], [1630, 105]]);
					}
				}
			}
			color(c = [0.7000000000, 0, 0]) {
				translate(v = [0, 0, 1310.0000000000]) {
					linear_extrude(height = 180.0000000000) {
						polygon(paths = [[0, 1, 2, 3, 4, 5, 6, 7]], points = [[1840, 105], [1840, 2615], [1990, 2615], [1990, 1325], [2270, 1325], [2270, 995], [1990, 995], [1990, 105]]);
					}
				}
			}
			color(c = [0.1000000000, 0.1000000000, 0.1000000000]) {
				translate(v = [0, 0, 1490.0000000000]) {
					linear_extrude(height = 686.1000000000) {
						polygon(paths = [[0, 1, 2, 3]], points = [[675, 275], [675, 445], [845, 445], [845, 275]]);
					}
				}
			}
			color(c = [0.1000000000, 0.1000000000, 0.1000000000]) {
				translate(v = [0, 0, 1490.0000000000]) {
					linear_extrude(height = 686.1000000000) {
						polygon(paths = [[0, 1, 2, 3]], points = [[175, 295], [175, 465], [345, 465], [345, 295]]);
					}
				}
			}
			color(c = [0.1000000000, 0.1000000000, 0.1000000000]) {
				translate(v = [0, 0, 1490.0000000000]) {
					linear_extrude(height = 686.1000000000) {
						polygon(paths = [[0, 1, 2, 3]], points = [[1205, 295], [1205, 465], [1375, 465], [1375, 295]]);
					}
				}
			}
			color(c = [0.1000000000, 0.1000000000, 0.1000000000]) {
				translate(v = [0, 0, 1490.0000000000]) {
					linear_extrude(height = 686.1000000000) {
						polygon(paths = [[0, 1, 2, 3]], points = [[2045, 295], [2045, 465], [2215, 465], [2215, 295]]);
					}
				}
			}
			color(c = [0.1000000000, 0.1000000000, 0.1000000000]) {
				translate(v = [0, 0, 1490.0000000000]) {
					linear_extrude(height = 686.1000000000) {
						polygon(paths = [[0, 1, 2, 3]], points = [[2385, 295], [2385, 465], [2555, 465], [2555, 295]]);
					}
				}
			}
			color(c = [0.1000000000, 0.1000000000, 0.1000000000]) {
				translate(v = [0, 0, 1490.0000000000]) {
					linear_extrude(height = 686.1000000000) {
						polygon(paths = [[0, 1, 2, 3]], points = [[175, 635], [175, 805], [345, 805], [345, 635]]);
					}
				}
			}
			color(c = [0.1000000000, 0.1000000000, 0.1000000000]) {
				translate(v = [0, 0, 1490.0000000000]) {
					linear_extrude(height = 686.1000000000) {
						polygon(paths = [[0, 1, 2, 3]], points = [[1205, 635], [1205, 805], [1375, 805], [1375, 635]]);
					}
				}
			}
			color(c = [0.1000000000, 0.1000000000, 0.1000000000]) {
				translate(v = [0, 0, 1490.0000000000]) {
					linear_extrude(height = 686.1000000000) {
						polygon(paths = [[0, 1, 2, 3]], points = [[2045, 635], [2045, 805], [2215, 805], [2215, 635]]);
					}
				}
			}
			color(c = [0.1000000000, 0.1000000000, 0.1000000000]) {
				translate(v = [0, 0, 1490.0000000000]) {
					linear_extrude(height = 686.1000000000) {
						polygon(paths = [[0, 1, 2, 3]], points = [[2385, 635], [2385, 805], [2555, 805], [2555, 635]]);
					}
				}
			}
			color(c = [0.1000000000, 0.1000000000, 0.1000000000]) {
				translate(v = [0, 0, 1490.0000000000]) {
					linear_extrude(height = 686.1000000000) {
						polygon(paths = [[0, 1, 2, 3]], points = [[225, 1075], [225, 1245], [395, 1245], [395, 1075]]);
					}
				}
			}
			color(c = [0.1000000000, 0.1000000000, 0.1000000000]) {
				translate(v = [0, 0, 1490.0000000000]) {
					linear_extrude(height = 686.1000000000) {
						polygon(paths = [[0, 1, 2, 3]], points = [[810, 1075], [810, 1245], [980, 1245], [980, 1075]]);
					}
				}
			}
			color(c = [0.1000000000, 0.1000000000, 0.1000000000]) {
				translate(v = [0, 0, 1490.0000000000]) {
					linear_extrude(height = 686.1000000000) {
						polygon(paths = [[0, 1, 2, 3]], points = [[1350, 1075], [1350, 1245], [1520, 1245], [1520, 1075]]);
					}
				}
			}
			color(c = [0.1000000000, 0.1000000000, 0.1000000000]) {
				translate(v = [0, 0, 1490.0000000000]) {
					linear_extrude(height = 686.1000000000) {
						polygon(paths = [[0, 1, 2, 3]], points = [[2050, 1075], [2050, 1245], [2220, 1245], [2220, 1075]]);
					}
				}
			}
			color(c = [0.1000000000, 0.1000000000, 0.1000000000]) {
				translate(v = [0, 0, 1490.0000000000]) {
					linear_extrude(height = 686.1000000000) {
						polygon(paths = [[0, 1, 2, 3]], points = [[175, 1575], [175, 1745], [345, 1745], [345, 1575]]);
					}
				}
			}
			color(c = [0.1000000000, 0.1000000000, 0.1000000000]) {
				translate(v = [0, 0, 1490.0000000000]) {
					linear_extrude(height = 686.1000000000) {
						polygon(paths = [[0, 1, 2, 3]], points = [[1025, 1595], [1025, 1765], [1195, 1765], [1195, 1595]]);
					}
				}
			}
			color(c = [0.1000000000, 0.1000000000, 0.1000000000]) {
				translate(v = [0, 0, 1490.0000000000]) {
					linear_extrude(height = 686.1000000000) {
						polygon(paths = [[0, 1, 2, 3]], points = [[175, 1915], [175, 2085], [345, 2085], [345, 1915]]);
					}
				}
			}
			color(c = [0.1000000000, 0.1000000000, 0.1000000000]) {
				translate(v = [0, 0, 1490.0000000000]) {
					linear_extrude(height = 686.1000000000) {
						polygon(paths = [[0, 1, 2, 3]], points = [[1025, 1935], [1025, 2105], [1195, 2105], [1195, 1935]]);
					}
				}
			}
			color(c = [0.1000000000, 0.1000000000, 0.1000000000]) {
				translate(v = [0, 0, 1490.0000000000]) {
					linear_extrude(height = 686.1000000000) {
						polygon(paths = [[0, 1, 2, 3]], points = [[2055, 1935], [2055, 2105], [2225, 2105], [2225, 1935]]);
					}
				}
			}
			color(c = [0.1000000000, 0.1000000000, 0.1000000000]) {
				translate(v = [0, 0, 1490.0000000000]) {
					linear_extrude(height = 686.1000000000) {
						polygon(paths = [[0, 1, 2, 3]], points = [[2395, 1935], [2395, 2105], [2565, 2105], [2565, 1935]]);
					}
				}
			}
			color(c = [0.1000000000, 0.1000000000, 0.1000000000]) {
				translate(v = [0, 0, 1490.0000000000]) {
					linear_extrude(height = 686.1000000000) {
						polygon(paths = [[0, 1, 2, 3]], points = [[175, 2255], [175, 2425], [345, 2425], [345, 2255]]);
					}
				}
			}
			color(c = [0.1000000000, 0.1000000000, 0.1000000000]) {
				translate(v = [0, 0, 1490.0000000000]) {
					linear_extrude(height = 686.1000000000) {
						polygon(paths = [[0, 1, 2, 3]], points = [[1025, 2275], [1025, 2445], [1195, 2445], [1195, 2275]]);
					}
				}
			}
			color(c = [0.1000000000, 0.1000000000, 0.1000000000]) {
				translate(v = [0, 0, 1490.0000000000]) {
					linear_extrude(height = 686.1000000000) {
						polygon(paths = [[0, 1, 2, 3]], points = [[1525, 2275], [1525, 2445], [1695, 2445], [1695, 2275]]);
					}
				}
			}
			color(c = [0.1000000000, 0.1000000000, 0.1000000000]) {
				translate(v = [0, 0, 1490.0000000000]) {
					linear_extrude(height = 686.1000000000) {
						polygon(paths = [[0, 1, 2, 3]], points = [[2055, 2275], [2055, 2445], [2225, 2445], [2225, 2275]]);
					}
				}
			}
			color(c = [0.1000000000, 0.1000000000, 0.1000000000]) {
				translate(v = [0, 0, 1490.0000000000]) {
					linear_extrude(height = 686.1000000000) {
						polygon(paths = [[0, 1, 2, 3]], points = [[2395, 2275], [2395, 2445], [2565, 2445], [2565, 2275]]);
					}
				}
			}
			color(c = [0.9000000000, 0.6000000000, 0.6000000000]) {
				translate(v = [0, 0, 2176.1000000000]) {
					linear_extrude(height = 100.0000000000) {
						polygon(paths = [[0, 1, 2, 3, 4, 5, 6, 7]], points = [[0, -85], [0, 85], [595, 85], [595, 445], [925, 445], [925, 85], [2760, 85], [2760, -85]]);
					}
				}
			}
			color(c = [0.9000000000, 0.6000000000, 0.6000000000]) {
				translate(v = [0, 0, 2176.1000000000]) {
					linear_extrude(height = 100.0000000000) {
						polygon(paths = [[0, 1, 2, 3, 4, 5, 6, 7]], points = [[95, 255], [95, 825], [1455, 825], [1455, 255], [1125, 255], [1125, 615], [425, 615], [425, 255]]);
					}
				}
			}
			color(c = [0.9000000000, 0.6000000000, 0.6000000000]) {
				translate(v = [0, 0, 2176.1000000000]) {
					linear_extrude(height = 100.0000000000) {
						polygon(paths = [[0, 1, 2, 3]], points = [[85, 995], [85, 1325], [395, 1325], [395, 995]]);
					}
				}
			}
			color(c = [0.9000000000, 0.6000000000, 0.6000000000]) {
				translate(v = [0, 0, 2176.1000000000]) {
					linear_extrude(height = 100.0000000000) {
						polygon(paths = [[0, 1, 2, 3, 4, 5]], points = [[1300, 995], [1300, 1325], [1470, 1325], [1470, 1615], [1795, 1615], [1795, 995]]);
					}
				}
			}
			color(c = [0.9000000000, 0.6000000000, 0.6000000000]) {
				translate(v = [0, 0, 2176.1000000000]) {
					linear_extrude(height = 100.0000000000) {
						polygon(paths = [[0, 1, 2, 3]], points = [[1970, 1075], [1970, 1615], [2300, 1615], [2300, 1075]]);
					}
				}
			}
			color(c = [0.9000000000, 0.6000000000, 0.6000000000]) {
				translate(v = [0, 0, 2176.1000000000]) {
					linear_extrude(height = 100.0000000000) {
						polygon(paths = [[0, 1, 2, 3, 4, 5]], points = [[605, 995], [605, 2250], [775, 2250], [775, 1325], [980, 1325], [980, 995]]);
					}
				}
			}
			color(c = [0.9000000000, 0.6000000000, 0.6000000000]) {
				translate(v = [0, 0, 2176.1000000000]) {
					linear_extrude(height = 100.0000000000) {
						polygon(paths = [[0, 1, 2, 3, 4, 5, 6, 7, 8, 9, 10, 11, 12, 13]], points = [[1965, 255], [1965, 845], [2470, 845], [2470, 1815], [1275, 1815], [1275, 1595], [945, 1595], [945, 2445], [1275, 2445], [1275, 2045], [1975, 2045], [1975, 2465], [2675, 2465], [2675, 255]]);
					}
				}
			}
			color(c = [0.9000000000, 0.6000000000, 0.6000000000]) {
				translate(v = [0, 0, 2176.1000000000]) {
					linear_extrude(height = 100.0000000000) {
						polygon(paths = [[0, 1, 2, 3, 4, 5, 6, 7, 8, 9, 10, 11]], points = [[95, 1575], [95, 2635], [0, 2635], [0, 2805], [2760, 2805], [2760, 2635], [1775, 2635], [1775, 2275], [1445, 2275], [1445, 2635], [425, 2635], [425, 1575]]);
					}
				}
			}
			color(c = [0.5000000000, 0.5000000000, 0.5000000000]) {
				translate(v = [0, 0, 2276.1000000000]) {
					linear_extrude(height = 340.0000000000) {
						polygon(paths = [[0, 1, 2, 3]], points = [[145, -85], [145, 85], [315, 85], [315, -85]]);
					}
				}
			}
			color(c = [0.5000000000, 0.5000000000, 0.5000000000]) {
				translate(v = [0, 0, 2276.1000000000]) {
					linear_extrude(height = 340.0000000000) {
						polygon(paths = [[0, 1, 2, 3]], points = [[605, -85], [605, 85], [775, 85], [775, -85]]);
					}
				}
			}
			color(c = [0.5000000000, 0.5000000000, 0.5000000000]) {
				translate(v = [0, 0, 2276.1000000000]) {
					linear_extrude(height = 340.0000000000) {
						polygon(paths = [[0, 1, 2, 3]], points = [[1065, -85], [1065, 85], [1235, 85], [1235, -85]]);
					}
				}
			}
			color(c = [0.5000000000, 0.5000000000, 0.5000000000]) {
				translate(v = [0, 0, 2276.1000000000]) {
					linear_extrude(height = 340.0000000000) {
						polygon(paths = [[0, 1, 2, 3]], points = [[1525, -85], [1525, 85], [1695, 85], [1695, -85]]);
					}
				}
			}
			color(c = [0.5000000000, 0.5000000000, 0.5000000000]) {
				translate(v = [0, 0, 2276.1000000000]) {
					linear_extrude(height = 340.0000000000) {
						polygon(paths = [[0, 1, 2, 3]], points = [[1985, -85], [1985, 85], [2155, 85], [2155, -85]]);
					}
				}
			}
			color(c = [0.5000000000, 0.5000000000, 0.5000000000]) {
				translate(v = [0, 0, 2276.1000000000]) {
					linear_extrude(height = 340.0000000000) {
						polygon(paths = [[0, 1, 2, 3]], points = [[2445, -85], [2445, 85], [2615, 85], [2615, -85]]);
					}
				}
			}
			color(c = [0.5000000000, 0.5000000000, 0.5000000000]) {
				translate(v = [0, 0, 2276.1000000000]) {
					linear_extrude(height = 340.0000000000) {
						polygon(paths = [[0, 1, 2, 3]], points = [[145, 2635], [145, 2805], [315, 2805], [315, 2635]]);
					}
				}
			}
			color(c = [0.5000000000, 0.5000000000, 0.5000000000]) {
				translate(v = [0, 0, 2276.1000000000]) {
					linear_extrude(height = 340.0000000000) {
						polygon(paths = [[0, 1, 2, 3]], points = [[605, 2635], [605, 2805], [775, 2805], [775, 2635]]);
					}
				}
			}
			color(c = [0.5000000000, 0.5000000000, 0.5000000000]) {
				translate(v = [0, 0, 2276.1000000000]) {
					linear_extrude(height = 340.0000000000) {
						polygon(paths = [[0, 1, 2, 3]], points = [[1065, 2635], [1065, 2805], [1235, 2805], [1235, 2635]]);
					}
				}
			}
			color(c = [0.5000000000, 0.5000000000, 0.5000000000]) {
				translate(v = [0, 0, 2276.1000000000]) {
					linear_extrude(height = 340.0000000000) {
						polygon(paths = [[0, 1, 2, 3]], points = [[1525, 2635], [1525, 2805], [1695, 2805], [1695, 2635]]);
					}
				}
			}
			color(c = [0.5000000000, 0.5000000000, 0.5000000000]) {
				translate(v = [0, 0, 2276.1000000000]) {
					linear_extrude(height = 340.0000000000) {
						polygon(paths = [[0, 1, 2, 3]], points = [[1985, 2635], [1985, 2805], [2155, 2805], [2155, 2635]]);
					}
				}
			}
			color(c = [0.5000000000, 0.5000000000, 0.5000000000]) {
				translate(v = [0, 0, 2276.1000000000]) {
					linear_extrude(height = 340.0000000000) {
						polygon(paths = [[0, 1, 2, 3]], points = [[2445, 2635], [2445, 2805], [2615, 2805], [2615, 2635]]);
					}
				}
			}
			color(c = [0.3000000000, 0.3000000000, 1]) {
				translate(v = [0, 0, 2616.1000000000]) {
					linear_extrude(height = 360.0000000000) {
						polygon(paths = [[0, 1, 2, 3]], points = [[0, -240], [0, 240], [2760, 240], [2760, -240]]);
					}
				}
			}
			color(c = [0.3000000000, 0.3000000000, 1]) {
				translate(v = [0, 0, 2616.1000000000]) {
					linear_extrude(height = 360.0000000000) {
						polygon(paths = [[0, 1, 2, 3]], points = [[0, 2480], [0, 2960], [2760, 2960], [2760, 2480]]);
					}
				}
			}
		}
	}
}
